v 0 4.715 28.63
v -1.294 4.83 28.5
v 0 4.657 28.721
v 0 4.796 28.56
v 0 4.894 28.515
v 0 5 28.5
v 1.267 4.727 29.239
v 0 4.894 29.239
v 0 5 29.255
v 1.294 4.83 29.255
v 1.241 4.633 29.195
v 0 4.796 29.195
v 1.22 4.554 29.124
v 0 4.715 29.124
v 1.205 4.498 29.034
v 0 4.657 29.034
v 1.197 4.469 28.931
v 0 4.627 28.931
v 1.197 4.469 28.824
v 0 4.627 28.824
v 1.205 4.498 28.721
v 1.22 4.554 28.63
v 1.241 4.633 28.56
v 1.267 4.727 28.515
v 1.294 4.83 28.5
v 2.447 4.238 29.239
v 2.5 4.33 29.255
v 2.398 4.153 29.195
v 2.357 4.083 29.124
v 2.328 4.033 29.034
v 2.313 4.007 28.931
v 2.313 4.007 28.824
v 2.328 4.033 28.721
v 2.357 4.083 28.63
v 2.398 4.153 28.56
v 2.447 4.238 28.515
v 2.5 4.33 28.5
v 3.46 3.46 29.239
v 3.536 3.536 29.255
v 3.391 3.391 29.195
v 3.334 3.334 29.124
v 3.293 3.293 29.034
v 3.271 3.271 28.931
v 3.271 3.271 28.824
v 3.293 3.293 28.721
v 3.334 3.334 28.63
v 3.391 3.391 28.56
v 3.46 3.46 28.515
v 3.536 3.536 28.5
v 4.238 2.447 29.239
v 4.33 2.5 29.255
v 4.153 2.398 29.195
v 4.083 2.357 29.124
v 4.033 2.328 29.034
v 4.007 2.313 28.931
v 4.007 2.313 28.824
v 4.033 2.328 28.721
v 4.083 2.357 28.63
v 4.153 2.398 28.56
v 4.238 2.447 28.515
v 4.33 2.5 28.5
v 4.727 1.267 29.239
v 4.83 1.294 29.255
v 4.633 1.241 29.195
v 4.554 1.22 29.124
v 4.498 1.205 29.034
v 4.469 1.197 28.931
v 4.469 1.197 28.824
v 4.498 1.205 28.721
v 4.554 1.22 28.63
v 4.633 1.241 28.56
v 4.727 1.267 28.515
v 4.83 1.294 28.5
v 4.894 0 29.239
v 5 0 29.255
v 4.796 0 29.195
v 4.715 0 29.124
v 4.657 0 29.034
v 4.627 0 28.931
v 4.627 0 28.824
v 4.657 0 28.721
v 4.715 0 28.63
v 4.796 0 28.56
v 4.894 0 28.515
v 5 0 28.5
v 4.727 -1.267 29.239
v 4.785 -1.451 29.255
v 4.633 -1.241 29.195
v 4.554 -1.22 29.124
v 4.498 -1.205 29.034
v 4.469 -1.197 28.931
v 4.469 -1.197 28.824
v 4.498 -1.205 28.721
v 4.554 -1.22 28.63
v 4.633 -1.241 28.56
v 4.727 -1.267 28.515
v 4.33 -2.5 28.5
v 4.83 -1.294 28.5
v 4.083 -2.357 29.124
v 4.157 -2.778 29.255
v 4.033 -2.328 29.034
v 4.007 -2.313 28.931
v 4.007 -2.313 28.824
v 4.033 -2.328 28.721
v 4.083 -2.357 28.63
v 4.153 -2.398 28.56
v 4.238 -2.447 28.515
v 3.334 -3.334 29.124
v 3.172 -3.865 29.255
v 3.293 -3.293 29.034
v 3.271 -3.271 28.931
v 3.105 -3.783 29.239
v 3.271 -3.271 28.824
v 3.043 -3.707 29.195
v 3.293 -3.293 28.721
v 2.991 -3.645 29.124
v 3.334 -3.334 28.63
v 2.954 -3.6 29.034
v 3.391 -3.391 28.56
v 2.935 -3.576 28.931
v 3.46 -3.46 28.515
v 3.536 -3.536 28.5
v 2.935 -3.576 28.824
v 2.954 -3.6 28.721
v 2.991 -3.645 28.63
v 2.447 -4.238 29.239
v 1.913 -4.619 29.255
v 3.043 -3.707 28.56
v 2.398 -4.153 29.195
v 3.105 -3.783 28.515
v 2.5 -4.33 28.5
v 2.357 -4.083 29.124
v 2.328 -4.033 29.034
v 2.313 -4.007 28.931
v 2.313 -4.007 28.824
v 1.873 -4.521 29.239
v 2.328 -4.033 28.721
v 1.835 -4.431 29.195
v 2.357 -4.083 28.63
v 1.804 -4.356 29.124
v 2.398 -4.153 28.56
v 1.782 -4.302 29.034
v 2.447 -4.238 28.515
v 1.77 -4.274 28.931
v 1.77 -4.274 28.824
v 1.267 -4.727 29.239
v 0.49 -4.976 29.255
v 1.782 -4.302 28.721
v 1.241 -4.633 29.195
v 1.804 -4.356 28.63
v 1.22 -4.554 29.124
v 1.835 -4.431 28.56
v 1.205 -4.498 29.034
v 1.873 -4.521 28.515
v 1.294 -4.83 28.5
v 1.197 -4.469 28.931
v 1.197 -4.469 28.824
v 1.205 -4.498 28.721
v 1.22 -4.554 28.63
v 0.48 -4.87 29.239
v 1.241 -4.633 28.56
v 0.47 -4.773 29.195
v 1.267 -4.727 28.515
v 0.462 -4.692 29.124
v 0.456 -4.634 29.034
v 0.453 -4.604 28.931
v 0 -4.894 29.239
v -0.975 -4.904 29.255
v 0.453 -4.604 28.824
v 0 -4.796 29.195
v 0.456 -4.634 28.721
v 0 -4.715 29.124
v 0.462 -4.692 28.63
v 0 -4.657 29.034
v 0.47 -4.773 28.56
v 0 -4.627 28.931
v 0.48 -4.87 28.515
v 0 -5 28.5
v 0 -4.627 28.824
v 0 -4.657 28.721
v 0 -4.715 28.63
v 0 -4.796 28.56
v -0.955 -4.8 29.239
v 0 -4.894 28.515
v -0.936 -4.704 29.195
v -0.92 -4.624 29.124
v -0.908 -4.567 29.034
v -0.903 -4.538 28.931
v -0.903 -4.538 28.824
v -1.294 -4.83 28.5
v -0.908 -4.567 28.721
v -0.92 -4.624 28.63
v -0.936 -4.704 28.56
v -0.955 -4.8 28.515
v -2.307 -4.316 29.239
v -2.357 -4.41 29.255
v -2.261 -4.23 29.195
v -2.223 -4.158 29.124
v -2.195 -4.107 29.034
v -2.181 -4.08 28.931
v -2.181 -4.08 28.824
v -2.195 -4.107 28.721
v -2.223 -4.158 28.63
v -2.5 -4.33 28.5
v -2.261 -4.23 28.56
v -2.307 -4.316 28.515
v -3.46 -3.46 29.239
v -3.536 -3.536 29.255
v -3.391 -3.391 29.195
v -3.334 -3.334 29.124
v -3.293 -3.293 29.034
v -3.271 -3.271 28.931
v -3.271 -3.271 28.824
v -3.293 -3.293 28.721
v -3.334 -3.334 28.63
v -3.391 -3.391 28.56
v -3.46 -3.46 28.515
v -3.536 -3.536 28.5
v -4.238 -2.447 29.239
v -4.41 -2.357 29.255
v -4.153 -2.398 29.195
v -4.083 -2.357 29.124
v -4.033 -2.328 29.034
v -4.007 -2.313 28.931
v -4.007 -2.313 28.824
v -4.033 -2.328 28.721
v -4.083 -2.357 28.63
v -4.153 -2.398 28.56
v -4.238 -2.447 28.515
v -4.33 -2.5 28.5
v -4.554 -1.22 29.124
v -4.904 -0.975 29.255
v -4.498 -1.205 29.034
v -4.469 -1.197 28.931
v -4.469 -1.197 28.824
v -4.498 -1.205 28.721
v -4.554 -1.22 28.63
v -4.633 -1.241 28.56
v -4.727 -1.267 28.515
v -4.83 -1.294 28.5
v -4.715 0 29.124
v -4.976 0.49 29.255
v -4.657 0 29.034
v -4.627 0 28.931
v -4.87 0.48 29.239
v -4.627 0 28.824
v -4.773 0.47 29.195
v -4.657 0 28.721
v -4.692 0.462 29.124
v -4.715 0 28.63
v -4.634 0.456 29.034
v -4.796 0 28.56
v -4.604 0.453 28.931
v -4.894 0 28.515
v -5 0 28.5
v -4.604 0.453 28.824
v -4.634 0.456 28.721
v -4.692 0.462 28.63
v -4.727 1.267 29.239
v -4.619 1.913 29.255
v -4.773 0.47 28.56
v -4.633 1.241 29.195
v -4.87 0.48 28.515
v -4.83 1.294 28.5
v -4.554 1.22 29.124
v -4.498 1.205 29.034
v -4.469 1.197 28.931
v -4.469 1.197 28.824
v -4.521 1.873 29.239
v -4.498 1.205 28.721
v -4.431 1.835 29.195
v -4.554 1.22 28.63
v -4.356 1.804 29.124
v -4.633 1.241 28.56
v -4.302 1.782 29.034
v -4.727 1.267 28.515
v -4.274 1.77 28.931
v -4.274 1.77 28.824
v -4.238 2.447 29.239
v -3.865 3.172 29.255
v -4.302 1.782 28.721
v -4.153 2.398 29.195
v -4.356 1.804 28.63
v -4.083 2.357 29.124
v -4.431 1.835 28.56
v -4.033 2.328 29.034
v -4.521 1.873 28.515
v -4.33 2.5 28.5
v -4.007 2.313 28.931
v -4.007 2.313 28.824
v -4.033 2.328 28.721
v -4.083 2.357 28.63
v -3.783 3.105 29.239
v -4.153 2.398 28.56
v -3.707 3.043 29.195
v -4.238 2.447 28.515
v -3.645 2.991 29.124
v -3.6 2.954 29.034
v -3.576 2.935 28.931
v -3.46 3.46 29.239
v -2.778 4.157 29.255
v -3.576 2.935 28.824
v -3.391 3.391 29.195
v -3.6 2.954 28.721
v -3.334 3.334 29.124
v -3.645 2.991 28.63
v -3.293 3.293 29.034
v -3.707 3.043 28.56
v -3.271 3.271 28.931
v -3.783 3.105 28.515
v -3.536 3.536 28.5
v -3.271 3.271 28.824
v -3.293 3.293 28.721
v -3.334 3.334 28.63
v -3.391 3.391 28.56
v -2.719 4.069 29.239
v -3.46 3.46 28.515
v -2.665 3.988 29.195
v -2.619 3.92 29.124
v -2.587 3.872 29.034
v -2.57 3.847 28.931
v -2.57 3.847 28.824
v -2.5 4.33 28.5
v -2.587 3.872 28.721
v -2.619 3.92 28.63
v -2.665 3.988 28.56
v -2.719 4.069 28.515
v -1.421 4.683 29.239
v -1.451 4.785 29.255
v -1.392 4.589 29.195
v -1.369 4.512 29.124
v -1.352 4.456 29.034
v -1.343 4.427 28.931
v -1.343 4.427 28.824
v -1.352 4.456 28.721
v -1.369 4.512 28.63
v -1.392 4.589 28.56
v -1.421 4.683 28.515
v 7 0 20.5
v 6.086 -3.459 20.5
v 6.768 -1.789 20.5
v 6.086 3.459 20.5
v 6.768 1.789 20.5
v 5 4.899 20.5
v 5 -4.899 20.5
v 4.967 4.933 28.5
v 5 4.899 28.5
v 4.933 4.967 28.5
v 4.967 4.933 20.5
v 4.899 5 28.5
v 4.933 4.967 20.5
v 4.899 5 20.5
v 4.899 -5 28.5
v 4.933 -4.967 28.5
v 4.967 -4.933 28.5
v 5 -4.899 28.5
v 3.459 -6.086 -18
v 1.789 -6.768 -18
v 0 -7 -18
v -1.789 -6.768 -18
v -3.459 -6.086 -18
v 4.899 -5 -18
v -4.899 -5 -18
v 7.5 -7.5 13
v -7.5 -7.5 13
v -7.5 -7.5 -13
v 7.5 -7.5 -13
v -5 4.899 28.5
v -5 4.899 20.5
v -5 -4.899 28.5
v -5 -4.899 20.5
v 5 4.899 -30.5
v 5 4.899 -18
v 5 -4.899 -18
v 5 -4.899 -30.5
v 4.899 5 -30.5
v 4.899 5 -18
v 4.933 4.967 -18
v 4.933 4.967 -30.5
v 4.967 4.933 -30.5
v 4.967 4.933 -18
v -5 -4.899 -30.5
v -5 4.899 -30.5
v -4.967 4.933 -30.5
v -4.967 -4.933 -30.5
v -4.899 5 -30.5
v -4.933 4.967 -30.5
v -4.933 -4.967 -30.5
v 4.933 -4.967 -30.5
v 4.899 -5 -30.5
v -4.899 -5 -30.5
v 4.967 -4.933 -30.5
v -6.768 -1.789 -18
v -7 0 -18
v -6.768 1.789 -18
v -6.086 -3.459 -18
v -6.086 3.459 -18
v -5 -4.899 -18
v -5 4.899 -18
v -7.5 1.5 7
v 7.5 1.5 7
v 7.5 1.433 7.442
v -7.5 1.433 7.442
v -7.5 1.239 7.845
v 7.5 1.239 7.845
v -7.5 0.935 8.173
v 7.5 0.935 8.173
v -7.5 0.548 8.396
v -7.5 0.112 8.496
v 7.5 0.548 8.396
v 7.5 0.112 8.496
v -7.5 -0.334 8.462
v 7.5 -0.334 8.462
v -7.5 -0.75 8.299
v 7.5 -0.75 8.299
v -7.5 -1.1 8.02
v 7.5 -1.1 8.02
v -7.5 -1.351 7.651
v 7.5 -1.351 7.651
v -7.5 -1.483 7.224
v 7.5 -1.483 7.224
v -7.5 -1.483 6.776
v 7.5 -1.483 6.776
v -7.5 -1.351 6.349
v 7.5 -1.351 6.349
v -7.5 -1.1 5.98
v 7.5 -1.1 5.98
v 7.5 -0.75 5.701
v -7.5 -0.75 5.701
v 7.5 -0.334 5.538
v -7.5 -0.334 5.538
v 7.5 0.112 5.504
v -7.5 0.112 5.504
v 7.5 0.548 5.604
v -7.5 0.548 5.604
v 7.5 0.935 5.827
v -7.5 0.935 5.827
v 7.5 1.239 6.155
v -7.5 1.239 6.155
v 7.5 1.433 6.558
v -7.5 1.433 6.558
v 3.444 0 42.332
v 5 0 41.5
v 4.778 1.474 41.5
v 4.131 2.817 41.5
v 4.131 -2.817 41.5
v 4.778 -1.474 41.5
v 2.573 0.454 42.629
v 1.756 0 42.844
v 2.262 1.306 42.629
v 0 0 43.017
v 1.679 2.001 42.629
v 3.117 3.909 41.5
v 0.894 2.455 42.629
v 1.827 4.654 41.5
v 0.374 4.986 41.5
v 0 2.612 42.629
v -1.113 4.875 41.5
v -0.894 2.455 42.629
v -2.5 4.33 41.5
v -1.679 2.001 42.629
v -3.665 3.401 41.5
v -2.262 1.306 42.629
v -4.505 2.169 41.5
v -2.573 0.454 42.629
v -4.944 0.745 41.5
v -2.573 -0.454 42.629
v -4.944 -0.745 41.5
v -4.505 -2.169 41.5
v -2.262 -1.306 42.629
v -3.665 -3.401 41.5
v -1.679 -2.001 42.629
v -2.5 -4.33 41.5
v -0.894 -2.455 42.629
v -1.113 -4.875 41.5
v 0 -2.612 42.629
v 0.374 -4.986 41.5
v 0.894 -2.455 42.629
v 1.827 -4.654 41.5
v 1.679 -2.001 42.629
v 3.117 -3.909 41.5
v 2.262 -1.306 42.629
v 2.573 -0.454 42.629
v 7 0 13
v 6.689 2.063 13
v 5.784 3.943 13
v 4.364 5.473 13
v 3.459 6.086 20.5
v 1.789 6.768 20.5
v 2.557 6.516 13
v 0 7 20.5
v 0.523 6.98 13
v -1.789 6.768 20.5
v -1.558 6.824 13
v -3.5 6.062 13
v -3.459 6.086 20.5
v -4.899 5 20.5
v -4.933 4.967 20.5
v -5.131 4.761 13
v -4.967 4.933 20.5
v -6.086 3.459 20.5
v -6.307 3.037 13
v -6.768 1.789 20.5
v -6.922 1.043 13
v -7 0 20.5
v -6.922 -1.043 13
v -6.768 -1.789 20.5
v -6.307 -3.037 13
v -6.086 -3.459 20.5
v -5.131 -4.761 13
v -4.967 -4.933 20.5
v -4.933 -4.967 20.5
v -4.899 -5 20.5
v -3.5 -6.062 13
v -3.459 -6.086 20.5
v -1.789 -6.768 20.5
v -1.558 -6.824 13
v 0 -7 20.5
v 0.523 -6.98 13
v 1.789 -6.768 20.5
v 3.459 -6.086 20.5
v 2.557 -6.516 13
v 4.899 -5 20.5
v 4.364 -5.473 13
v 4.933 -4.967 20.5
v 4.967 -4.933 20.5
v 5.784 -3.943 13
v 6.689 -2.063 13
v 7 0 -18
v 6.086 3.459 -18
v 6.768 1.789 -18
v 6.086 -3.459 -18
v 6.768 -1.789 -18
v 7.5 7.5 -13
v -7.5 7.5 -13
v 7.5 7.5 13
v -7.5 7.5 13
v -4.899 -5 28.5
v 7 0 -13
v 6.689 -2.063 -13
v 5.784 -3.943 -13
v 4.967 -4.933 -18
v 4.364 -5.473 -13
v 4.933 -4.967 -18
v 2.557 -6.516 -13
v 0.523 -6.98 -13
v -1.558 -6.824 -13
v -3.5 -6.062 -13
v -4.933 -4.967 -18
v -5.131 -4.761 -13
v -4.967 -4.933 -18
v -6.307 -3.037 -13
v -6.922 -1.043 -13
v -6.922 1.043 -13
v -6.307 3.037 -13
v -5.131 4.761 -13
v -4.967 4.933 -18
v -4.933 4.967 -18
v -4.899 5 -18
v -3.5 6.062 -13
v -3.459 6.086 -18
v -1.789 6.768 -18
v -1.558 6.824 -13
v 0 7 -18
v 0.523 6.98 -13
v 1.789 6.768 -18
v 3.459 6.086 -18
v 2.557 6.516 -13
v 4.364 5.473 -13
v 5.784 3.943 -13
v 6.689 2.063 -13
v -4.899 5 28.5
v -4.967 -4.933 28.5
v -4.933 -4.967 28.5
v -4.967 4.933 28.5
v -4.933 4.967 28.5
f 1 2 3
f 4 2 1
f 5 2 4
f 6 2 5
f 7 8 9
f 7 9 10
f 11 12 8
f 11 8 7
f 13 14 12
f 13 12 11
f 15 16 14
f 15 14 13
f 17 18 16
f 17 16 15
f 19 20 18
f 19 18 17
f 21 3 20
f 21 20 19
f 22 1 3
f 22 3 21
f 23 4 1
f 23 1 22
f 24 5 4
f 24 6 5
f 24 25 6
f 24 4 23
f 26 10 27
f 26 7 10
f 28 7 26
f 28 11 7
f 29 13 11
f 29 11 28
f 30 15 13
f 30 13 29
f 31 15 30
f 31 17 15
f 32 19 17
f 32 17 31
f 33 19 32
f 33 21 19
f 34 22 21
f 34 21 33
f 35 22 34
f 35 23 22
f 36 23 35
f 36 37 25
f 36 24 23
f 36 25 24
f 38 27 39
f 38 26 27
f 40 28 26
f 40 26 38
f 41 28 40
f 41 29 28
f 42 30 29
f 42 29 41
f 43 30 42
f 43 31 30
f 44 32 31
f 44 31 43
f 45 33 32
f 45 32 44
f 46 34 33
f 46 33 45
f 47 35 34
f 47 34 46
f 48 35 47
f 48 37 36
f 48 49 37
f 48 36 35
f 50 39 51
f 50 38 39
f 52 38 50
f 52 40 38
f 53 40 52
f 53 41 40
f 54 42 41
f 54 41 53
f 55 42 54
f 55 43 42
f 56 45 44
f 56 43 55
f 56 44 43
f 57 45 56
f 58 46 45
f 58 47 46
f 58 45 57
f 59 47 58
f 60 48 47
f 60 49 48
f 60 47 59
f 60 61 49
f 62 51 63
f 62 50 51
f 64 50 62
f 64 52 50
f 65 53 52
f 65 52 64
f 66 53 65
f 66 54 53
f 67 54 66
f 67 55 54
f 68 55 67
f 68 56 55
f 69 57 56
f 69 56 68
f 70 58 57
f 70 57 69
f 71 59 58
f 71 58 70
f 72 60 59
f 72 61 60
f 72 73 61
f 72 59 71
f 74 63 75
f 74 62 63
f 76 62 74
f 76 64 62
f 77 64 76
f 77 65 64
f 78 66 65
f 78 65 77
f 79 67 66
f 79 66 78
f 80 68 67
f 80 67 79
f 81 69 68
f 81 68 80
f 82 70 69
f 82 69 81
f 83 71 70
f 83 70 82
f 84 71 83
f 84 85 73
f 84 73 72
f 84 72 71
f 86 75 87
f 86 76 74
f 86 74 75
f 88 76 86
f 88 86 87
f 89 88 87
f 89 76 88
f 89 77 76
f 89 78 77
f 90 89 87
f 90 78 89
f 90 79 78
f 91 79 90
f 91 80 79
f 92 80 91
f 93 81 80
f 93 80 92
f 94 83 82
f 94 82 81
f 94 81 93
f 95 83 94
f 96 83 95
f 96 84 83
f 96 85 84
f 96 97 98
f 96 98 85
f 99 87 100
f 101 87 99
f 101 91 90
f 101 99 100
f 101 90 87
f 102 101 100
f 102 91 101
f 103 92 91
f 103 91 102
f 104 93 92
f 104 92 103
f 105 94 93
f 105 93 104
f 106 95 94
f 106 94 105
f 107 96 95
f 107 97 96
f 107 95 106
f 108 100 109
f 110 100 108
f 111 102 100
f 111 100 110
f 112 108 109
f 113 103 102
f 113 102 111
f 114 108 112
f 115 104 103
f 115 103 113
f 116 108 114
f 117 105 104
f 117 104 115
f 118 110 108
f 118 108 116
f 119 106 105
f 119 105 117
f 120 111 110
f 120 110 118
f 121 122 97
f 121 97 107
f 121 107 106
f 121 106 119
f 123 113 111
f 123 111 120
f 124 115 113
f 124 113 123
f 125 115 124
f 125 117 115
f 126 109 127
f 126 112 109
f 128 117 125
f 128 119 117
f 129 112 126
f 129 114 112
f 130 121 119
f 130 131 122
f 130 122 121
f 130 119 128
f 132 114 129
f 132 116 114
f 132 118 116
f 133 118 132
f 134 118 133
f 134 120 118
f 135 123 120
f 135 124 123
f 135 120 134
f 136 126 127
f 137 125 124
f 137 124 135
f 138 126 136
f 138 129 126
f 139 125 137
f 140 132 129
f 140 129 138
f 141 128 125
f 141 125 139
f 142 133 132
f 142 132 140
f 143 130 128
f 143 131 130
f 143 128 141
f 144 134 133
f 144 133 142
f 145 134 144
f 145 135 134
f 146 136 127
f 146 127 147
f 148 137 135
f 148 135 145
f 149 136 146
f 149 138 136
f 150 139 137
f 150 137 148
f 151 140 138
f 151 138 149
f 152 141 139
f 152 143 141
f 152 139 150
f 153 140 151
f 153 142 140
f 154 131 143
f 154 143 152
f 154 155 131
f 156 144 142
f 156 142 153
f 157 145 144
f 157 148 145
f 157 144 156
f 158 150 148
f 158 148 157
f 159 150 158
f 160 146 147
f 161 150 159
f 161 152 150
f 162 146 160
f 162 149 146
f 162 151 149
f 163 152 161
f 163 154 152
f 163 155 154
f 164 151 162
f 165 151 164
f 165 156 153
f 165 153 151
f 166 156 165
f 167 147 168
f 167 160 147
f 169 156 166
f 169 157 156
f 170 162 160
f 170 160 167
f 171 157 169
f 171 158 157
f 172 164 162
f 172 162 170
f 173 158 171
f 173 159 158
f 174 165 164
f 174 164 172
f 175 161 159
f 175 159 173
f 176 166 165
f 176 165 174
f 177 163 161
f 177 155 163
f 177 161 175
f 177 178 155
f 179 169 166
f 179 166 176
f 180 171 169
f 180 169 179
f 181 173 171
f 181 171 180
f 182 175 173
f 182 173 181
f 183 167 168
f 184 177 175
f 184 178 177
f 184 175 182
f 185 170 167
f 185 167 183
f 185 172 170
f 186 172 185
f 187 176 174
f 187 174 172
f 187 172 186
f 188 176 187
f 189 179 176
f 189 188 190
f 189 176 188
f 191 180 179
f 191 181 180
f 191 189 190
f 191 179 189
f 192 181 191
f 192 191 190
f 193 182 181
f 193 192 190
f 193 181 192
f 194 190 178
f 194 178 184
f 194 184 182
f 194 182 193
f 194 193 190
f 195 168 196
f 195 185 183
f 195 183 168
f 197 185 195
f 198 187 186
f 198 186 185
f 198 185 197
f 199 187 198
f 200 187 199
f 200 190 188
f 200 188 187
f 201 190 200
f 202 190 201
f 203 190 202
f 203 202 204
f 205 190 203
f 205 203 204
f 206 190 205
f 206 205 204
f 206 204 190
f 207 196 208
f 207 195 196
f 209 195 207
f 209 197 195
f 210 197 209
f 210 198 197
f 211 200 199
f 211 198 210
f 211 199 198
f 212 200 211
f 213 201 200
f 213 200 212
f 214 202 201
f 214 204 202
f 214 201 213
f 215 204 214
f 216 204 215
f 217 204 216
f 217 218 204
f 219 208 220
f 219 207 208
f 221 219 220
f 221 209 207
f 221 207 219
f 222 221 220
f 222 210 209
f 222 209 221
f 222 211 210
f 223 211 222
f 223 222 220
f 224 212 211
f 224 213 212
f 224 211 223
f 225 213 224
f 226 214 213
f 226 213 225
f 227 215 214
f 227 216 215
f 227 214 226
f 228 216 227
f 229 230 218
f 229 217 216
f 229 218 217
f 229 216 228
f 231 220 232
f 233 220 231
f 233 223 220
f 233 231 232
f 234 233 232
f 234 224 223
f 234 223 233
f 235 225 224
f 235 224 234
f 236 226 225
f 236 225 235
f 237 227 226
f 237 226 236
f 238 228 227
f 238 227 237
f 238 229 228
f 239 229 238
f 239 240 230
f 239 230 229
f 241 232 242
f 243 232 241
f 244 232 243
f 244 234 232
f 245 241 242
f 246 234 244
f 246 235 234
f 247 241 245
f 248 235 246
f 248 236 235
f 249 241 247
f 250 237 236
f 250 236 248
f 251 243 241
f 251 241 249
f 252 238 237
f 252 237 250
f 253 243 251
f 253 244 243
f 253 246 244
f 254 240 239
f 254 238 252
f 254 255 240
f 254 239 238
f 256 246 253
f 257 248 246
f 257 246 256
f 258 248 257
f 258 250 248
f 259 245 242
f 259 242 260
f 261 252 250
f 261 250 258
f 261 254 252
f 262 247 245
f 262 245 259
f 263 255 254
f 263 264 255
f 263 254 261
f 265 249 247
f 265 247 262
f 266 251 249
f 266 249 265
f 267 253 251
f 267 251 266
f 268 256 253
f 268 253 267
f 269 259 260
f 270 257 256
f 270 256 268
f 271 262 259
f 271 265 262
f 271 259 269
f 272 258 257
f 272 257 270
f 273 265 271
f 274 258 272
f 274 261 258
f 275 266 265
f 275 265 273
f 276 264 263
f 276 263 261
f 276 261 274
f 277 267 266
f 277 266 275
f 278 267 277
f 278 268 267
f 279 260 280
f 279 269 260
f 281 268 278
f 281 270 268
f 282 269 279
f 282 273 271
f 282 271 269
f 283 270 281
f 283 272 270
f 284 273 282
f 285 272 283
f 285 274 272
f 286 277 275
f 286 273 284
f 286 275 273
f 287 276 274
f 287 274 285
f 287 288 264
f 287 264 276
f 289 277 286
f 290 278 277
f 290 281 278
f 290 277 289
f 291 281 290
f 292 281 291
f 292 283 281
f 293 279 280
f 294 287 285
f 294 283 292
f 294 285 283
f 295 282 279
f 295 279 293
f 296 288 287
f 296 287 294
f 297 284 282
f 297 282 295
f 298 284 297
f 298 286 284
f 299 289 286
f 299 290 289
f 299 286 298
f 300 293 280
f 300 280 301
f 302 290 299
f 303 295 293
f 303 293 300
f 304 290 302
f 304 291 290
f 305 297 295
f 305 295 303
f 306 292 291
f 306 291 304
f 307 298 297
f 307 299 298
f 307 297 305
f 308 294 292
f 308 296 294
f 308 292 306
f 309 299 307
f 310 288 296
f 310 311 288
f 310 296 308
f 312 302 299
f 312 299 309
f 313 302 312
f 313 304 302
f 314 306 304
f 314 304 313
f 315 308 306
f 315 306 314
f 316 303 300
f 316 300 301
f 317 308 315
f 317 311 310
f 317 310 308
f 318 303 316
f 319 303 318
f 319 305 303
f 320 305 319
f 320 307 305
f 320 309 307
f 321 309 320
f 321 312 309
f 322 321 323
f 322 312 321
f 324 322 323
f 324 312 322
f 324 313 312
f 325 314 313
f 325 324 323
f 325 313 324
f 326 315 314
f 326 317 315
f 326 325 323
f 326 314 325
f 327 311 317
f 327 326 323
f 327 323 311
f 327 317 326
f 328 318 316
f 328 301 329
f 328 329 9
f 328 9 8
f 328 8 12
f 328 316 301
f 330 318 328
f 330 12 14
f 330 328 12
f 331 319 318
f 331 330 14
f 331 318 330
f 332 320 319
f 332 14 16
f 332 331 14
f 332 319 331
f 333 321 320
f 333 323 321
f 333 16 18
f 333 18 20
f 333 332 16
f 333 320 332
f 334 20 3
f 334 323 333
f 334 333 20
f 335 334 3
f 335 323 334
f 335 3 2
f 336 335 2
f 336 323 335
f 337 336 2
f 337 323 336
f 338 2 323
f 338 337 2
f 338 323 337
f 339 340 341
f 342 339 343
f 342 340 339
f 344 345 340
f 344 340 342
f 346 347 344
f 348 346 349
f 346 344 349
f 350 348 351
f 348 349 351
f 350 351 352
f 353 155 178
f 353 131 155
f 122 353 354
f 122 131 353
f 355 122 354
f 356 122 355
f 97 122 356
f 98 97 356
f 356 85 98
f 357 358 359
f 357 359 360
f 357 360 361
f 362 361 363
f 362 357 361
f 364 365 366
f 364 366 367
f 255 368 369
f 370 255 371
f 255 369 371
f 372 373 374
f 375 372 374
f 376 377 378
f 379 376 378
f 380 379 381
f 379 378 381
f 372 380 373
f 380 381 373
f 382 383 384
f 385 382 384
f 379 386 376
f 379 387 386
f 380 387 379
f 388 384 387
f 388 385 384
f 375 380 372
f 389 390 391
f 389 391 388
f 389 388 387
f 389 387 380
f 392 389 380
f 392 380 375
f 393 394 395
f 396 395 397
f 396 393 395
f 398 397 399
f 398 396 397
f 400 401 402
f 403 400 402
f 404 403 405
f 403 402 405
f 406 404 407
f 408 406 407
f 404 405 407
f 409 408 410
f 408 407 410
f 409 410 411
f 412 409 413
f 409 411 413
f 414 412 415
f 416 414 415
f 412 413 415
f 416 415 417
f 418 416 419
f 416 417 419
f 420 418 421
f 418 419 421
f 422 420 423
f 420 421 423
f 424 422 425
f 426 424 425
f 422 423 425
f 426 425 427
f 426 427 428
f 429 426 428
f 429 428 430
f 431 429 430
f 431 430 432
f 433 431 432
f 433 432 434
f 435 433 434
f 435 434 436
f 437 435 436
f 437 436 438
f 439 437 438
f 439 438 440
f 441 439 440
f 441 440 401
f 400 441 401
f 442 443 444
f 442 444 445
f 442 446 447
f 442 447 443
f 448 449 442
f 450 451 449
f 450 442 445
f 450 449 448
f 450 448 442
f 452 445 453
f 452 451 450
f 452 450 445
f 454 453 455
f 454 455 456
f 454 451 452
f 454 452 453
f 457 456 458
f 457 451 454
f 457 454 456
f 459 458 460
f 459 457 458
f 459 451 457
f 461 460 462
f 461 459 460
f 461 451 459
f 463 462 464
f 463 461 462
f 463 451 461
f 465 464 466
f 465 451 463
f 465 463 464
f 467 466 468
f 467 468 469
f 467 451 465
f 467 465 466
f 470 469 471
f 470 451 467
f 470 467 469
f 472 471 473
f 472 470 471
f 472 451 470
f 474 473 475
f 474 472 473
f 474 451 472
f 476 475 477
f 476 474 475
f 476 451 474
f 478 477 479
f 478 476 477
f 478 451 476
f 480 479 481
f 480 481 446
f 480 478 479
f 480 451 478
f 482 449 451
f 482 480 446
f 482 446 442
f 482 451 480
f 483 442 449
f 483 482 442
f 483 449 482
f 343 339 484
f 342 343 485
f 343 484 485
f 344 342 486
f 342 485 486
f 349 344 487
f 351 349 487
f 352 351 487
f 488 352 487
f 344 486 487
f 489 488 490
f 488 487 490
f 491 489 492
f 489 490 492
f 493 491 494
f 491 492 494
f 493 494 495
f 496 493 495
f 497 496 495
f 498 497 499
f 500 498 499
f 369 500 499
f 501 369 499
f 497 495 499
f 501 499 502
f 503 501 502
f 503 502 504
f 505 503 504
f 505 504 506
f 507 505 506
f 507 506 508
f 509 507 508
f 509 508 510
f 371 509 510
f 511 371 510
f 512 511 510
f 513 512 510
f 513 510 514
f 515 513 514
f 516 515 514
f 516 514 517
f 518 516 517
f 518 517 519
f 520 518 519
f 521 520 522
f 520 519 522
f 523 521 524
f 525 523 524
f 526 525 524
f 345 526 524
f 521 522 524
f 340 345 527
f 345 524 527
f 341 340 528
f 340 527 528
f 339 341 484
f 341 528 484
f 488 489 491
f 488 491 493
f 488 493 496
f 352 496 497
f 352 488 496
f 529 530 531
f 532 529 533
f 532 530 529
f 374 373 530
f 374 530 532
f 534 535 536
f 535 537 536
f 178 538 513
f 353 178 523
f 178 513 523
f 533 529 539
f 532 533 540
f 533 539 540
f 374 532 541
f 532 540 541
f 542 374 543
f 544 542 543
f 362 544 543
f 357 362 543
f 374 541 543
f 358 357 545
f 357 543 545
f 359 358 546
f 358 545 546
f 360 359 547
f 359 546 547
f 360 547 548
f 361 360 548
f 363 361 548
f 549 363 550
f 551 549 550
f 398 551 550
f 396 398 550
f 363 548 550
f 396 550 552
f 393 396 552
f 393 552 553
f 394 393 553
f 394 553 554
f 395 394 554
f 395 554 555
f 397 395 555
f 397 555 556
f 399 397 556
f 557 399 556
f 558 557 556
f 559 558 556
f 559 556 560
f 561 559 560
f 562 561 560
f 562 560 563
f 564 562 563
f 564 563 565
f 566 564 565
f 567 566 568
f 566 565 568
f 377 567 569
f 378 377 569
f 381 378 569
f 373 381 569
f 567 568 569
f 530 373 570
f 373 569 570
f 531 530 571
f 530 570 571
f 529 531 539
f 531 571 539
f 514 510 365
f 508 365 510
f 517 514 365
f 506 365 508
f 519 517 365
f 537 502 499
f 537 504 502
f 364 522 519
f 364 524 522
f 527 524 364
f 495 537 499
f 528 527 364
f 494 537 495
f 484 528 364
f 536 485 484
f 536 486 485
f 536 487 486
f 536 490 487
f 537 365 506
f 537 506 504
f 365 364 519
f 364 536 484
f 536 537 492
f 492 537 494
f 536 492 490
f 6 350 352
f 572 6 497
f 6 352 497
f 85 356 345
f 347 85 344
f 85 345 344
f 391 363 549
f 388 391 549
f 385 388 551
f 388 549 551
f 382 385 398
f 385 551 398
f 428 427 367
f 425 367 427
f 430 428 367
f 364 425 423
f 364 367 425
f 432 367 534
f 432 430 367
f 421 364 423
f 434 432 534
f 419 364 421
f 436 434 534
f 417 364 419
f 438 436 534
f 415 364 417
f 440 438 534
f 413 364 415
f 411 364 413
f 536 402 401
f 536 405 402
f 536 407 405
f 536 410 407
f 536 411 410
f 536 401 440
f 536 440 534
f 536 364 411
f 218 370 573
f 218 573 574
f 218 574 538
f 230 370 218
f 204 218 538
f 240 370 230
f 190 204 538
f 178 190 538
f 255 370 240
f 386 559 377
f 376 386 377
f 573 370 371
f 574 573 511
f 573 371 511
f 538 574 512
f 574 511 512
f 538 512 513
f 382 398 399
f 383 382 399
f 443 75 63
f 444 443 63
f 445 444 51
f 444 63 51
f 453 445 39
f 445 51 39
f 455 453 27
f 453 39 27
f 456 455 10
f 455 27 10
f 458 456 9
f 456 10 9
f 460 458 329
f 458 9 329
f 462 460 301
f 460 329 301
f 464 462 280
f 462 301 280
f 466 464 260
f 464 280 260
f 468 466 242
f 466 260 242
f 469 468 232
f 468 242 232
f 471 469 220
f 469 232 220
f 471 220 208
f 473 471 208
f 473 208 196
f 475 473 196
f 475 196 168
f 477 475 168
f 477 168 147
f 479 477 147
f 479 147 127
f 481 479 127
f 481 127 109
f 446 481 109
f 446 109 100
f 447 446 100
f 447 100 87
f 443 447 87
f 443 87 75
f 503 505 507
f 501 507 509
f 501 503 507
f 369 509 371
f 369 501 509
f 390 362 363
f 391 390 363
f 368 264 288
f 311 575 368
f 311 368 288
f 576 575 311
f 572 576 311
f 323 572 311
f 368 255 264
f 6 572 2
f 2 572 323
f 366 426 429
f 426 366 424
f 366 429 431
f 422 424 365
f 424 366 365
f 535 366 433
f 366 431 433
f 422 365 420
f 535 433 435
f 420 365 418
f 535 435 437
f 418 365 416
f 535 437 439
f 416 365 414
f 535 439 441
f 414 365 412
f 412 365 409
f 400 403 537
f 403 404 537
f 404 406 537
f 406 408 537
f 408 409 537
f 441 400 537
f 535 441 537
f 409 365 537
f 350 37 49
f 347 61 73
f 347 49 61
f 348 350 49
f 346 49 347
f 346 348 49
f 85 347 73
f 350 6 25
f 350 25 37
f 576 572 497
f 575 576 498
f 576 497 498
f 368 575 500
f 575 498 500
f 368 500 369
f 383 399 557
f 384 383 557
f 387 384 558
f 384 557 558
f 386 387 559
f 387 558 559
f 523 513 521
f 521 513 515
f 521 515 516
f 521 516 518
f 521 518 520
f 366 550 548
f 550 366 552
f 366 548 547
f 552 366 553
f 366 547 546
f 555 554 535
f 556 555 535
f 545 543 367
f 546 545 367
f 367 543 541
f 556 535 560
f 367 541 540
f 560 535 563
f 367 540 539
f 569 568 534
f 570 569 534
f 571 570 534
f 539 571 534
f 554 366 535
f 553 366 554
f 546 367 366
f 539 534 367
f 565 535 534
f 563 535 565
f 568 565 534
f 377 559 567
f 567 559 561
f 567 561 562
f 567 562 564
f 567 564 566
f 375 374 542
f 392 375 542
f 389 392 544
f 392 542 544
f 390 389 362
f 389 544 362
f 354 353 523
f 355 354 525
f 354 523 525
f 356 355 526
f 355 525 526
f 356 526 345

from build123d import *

# Parameters (mm, degrees)
F0_W      = 15
F0_H      = 15
F1_DEPTH  = 13
F2_R      = 7
F3_DEPTH  = 5
F5_DEPTH  = 12.5
F6_R      = 7
F7_DEPTH  = 7.5
F9_DEPTH  = 8
F10_R     = 5
F11_DEPTH = 13
F16_R     = 1.5
F17_DEPTH = 25


with BuildPart() as f1:
    # F0 (on Top) → F1 (new body, symmetric)
    with BuildSketch(Plane.XY):
        Rectangle(F0_W, F0_H)
    extrude(amount=F1_DEPTH, both=True)

    # F2 (on face) → F3 (join)
    with BuildSketch(Plane(origin=(0, 0, -13), x_dir=(1, 0, 0), z_dir=(0, 0, -1))):
        Circle(F2_R)
    extrude(amount=F3_DEPTH)

    # F4 (on face) → F5 (join)
    with BuildSketch(Plane(origin=(0, 0, -18), x_dir=(1, 0, 0), z_dir=(0, 0, -1))):
        with BuildLine():
            Line((-4.8989794856, -5), (4.8989794856, -5))
            ThreePointArc((4.8989794856, -5), (4.9497474683, -4.9497474683), (5, -4.8989794856))
            Line((5, -4.8989794856), (5, 4.8989794856))
            ThreePointArc((5, 4.8989794856), (4.9497474683, 4.9497474683), (4.8989794856, 5))
            Line((4.8989794856, 5), (-4.8989794856, 5))
            ThreePointArc((-4.8989794856, 5), (-4.9497474683, 4.9497474683), (-5, 4.8989794856))
            Line((-5, 4.8989794856), (-5, -4.8989794856))
            ThreePointArc((-5, -4.8989794856), (-4.9497474683, -4.9497474683), (-4.8989794856, -5))
        make_face()
    extrude(amount=F5_DEPTH)

    # F6 (on face) → F7 (join)
    with BuildSketch(Plane.XY.offset(13)):
        Circle(F6_R)
    extrude(amount=F7_DEPTH)

    # F8 (on face) → F9 (join)
    with BuildSketch(Plane.XY.offset(20.5)):
        with BuildLine():
            Line((-4.8989794856, -5), (4.8989794856, -5))
            ThreePointArc((4.8989794856, -5), (4.9497474683, -4.9497474683), (5, -4.8989794856))
            Line((5, -4.8989794856), (5, 4.8989794856))
            ThreePointArc((5, 4.8989794856), (4.9497474683, 4.9497474683), (4.8989794856, 5))
            Line((4.8989794856, 5), (-4.8989794856, 5))
            ThreePointArc((-4.8989794856, 5), (-4.9497474683, 4.9497474683), (-5, 4.8989794856))
            Line((-5, 4.8989794856), (-5, -4.8989794856))
            ThreePointArc((-5, -4.8989794856), (-4.9497474683, -4.9497474683), (-4.8989794856, -5))
        make_face()
    extrude(amount=F9_DEPTH)

    # F10 (on face) → F11 (join)
    with BuildSketch(Plane.XY.offset(28.5)):
        Circle(F10_R)
    extrude(amount=F11_DEPTH)

    # F12 (on Right) → F13 (revolve, cut)
    with BuildSketch(Plane.YZ):
        with BuildLine():
            Line((5, 28.5), (5, 29.2546096917))
            ThreePointArc((5, 29.2546096917), (4.6226951542, 28.8773048458), (5, 28.5))
        make_face()
    revolve(axis=Axis((0, 0, 28.5), (0, 0, -1)), mode=Mode.SUBTRACT)

    # F14 (on Front) → F15 (revolve)
    with BuildSketch(Plane.XZ):
        with BuildLine():
            Line((0, 41.5), (5, 41.5))
            ThreePointArc((5, 41.5), (2.6124860802, 42.6291713066), (0, 43.0166852265))
            Line((0, 43.0166852265), (0, 41.5))
        make_face()
    revolve(axis=Axis((0, 0, 41.5), (0, 0, 1)))

    # F16 (on face) → F17 (cut)
    with BuildSketch(Plane.YZ.offset(7.5)):
        with Locations((0, 7)):
            Circle(F16_R)
    extrude(amount=-F17_DEPTH, mode=Mode.SUBTRACT)


solid = f1.part
